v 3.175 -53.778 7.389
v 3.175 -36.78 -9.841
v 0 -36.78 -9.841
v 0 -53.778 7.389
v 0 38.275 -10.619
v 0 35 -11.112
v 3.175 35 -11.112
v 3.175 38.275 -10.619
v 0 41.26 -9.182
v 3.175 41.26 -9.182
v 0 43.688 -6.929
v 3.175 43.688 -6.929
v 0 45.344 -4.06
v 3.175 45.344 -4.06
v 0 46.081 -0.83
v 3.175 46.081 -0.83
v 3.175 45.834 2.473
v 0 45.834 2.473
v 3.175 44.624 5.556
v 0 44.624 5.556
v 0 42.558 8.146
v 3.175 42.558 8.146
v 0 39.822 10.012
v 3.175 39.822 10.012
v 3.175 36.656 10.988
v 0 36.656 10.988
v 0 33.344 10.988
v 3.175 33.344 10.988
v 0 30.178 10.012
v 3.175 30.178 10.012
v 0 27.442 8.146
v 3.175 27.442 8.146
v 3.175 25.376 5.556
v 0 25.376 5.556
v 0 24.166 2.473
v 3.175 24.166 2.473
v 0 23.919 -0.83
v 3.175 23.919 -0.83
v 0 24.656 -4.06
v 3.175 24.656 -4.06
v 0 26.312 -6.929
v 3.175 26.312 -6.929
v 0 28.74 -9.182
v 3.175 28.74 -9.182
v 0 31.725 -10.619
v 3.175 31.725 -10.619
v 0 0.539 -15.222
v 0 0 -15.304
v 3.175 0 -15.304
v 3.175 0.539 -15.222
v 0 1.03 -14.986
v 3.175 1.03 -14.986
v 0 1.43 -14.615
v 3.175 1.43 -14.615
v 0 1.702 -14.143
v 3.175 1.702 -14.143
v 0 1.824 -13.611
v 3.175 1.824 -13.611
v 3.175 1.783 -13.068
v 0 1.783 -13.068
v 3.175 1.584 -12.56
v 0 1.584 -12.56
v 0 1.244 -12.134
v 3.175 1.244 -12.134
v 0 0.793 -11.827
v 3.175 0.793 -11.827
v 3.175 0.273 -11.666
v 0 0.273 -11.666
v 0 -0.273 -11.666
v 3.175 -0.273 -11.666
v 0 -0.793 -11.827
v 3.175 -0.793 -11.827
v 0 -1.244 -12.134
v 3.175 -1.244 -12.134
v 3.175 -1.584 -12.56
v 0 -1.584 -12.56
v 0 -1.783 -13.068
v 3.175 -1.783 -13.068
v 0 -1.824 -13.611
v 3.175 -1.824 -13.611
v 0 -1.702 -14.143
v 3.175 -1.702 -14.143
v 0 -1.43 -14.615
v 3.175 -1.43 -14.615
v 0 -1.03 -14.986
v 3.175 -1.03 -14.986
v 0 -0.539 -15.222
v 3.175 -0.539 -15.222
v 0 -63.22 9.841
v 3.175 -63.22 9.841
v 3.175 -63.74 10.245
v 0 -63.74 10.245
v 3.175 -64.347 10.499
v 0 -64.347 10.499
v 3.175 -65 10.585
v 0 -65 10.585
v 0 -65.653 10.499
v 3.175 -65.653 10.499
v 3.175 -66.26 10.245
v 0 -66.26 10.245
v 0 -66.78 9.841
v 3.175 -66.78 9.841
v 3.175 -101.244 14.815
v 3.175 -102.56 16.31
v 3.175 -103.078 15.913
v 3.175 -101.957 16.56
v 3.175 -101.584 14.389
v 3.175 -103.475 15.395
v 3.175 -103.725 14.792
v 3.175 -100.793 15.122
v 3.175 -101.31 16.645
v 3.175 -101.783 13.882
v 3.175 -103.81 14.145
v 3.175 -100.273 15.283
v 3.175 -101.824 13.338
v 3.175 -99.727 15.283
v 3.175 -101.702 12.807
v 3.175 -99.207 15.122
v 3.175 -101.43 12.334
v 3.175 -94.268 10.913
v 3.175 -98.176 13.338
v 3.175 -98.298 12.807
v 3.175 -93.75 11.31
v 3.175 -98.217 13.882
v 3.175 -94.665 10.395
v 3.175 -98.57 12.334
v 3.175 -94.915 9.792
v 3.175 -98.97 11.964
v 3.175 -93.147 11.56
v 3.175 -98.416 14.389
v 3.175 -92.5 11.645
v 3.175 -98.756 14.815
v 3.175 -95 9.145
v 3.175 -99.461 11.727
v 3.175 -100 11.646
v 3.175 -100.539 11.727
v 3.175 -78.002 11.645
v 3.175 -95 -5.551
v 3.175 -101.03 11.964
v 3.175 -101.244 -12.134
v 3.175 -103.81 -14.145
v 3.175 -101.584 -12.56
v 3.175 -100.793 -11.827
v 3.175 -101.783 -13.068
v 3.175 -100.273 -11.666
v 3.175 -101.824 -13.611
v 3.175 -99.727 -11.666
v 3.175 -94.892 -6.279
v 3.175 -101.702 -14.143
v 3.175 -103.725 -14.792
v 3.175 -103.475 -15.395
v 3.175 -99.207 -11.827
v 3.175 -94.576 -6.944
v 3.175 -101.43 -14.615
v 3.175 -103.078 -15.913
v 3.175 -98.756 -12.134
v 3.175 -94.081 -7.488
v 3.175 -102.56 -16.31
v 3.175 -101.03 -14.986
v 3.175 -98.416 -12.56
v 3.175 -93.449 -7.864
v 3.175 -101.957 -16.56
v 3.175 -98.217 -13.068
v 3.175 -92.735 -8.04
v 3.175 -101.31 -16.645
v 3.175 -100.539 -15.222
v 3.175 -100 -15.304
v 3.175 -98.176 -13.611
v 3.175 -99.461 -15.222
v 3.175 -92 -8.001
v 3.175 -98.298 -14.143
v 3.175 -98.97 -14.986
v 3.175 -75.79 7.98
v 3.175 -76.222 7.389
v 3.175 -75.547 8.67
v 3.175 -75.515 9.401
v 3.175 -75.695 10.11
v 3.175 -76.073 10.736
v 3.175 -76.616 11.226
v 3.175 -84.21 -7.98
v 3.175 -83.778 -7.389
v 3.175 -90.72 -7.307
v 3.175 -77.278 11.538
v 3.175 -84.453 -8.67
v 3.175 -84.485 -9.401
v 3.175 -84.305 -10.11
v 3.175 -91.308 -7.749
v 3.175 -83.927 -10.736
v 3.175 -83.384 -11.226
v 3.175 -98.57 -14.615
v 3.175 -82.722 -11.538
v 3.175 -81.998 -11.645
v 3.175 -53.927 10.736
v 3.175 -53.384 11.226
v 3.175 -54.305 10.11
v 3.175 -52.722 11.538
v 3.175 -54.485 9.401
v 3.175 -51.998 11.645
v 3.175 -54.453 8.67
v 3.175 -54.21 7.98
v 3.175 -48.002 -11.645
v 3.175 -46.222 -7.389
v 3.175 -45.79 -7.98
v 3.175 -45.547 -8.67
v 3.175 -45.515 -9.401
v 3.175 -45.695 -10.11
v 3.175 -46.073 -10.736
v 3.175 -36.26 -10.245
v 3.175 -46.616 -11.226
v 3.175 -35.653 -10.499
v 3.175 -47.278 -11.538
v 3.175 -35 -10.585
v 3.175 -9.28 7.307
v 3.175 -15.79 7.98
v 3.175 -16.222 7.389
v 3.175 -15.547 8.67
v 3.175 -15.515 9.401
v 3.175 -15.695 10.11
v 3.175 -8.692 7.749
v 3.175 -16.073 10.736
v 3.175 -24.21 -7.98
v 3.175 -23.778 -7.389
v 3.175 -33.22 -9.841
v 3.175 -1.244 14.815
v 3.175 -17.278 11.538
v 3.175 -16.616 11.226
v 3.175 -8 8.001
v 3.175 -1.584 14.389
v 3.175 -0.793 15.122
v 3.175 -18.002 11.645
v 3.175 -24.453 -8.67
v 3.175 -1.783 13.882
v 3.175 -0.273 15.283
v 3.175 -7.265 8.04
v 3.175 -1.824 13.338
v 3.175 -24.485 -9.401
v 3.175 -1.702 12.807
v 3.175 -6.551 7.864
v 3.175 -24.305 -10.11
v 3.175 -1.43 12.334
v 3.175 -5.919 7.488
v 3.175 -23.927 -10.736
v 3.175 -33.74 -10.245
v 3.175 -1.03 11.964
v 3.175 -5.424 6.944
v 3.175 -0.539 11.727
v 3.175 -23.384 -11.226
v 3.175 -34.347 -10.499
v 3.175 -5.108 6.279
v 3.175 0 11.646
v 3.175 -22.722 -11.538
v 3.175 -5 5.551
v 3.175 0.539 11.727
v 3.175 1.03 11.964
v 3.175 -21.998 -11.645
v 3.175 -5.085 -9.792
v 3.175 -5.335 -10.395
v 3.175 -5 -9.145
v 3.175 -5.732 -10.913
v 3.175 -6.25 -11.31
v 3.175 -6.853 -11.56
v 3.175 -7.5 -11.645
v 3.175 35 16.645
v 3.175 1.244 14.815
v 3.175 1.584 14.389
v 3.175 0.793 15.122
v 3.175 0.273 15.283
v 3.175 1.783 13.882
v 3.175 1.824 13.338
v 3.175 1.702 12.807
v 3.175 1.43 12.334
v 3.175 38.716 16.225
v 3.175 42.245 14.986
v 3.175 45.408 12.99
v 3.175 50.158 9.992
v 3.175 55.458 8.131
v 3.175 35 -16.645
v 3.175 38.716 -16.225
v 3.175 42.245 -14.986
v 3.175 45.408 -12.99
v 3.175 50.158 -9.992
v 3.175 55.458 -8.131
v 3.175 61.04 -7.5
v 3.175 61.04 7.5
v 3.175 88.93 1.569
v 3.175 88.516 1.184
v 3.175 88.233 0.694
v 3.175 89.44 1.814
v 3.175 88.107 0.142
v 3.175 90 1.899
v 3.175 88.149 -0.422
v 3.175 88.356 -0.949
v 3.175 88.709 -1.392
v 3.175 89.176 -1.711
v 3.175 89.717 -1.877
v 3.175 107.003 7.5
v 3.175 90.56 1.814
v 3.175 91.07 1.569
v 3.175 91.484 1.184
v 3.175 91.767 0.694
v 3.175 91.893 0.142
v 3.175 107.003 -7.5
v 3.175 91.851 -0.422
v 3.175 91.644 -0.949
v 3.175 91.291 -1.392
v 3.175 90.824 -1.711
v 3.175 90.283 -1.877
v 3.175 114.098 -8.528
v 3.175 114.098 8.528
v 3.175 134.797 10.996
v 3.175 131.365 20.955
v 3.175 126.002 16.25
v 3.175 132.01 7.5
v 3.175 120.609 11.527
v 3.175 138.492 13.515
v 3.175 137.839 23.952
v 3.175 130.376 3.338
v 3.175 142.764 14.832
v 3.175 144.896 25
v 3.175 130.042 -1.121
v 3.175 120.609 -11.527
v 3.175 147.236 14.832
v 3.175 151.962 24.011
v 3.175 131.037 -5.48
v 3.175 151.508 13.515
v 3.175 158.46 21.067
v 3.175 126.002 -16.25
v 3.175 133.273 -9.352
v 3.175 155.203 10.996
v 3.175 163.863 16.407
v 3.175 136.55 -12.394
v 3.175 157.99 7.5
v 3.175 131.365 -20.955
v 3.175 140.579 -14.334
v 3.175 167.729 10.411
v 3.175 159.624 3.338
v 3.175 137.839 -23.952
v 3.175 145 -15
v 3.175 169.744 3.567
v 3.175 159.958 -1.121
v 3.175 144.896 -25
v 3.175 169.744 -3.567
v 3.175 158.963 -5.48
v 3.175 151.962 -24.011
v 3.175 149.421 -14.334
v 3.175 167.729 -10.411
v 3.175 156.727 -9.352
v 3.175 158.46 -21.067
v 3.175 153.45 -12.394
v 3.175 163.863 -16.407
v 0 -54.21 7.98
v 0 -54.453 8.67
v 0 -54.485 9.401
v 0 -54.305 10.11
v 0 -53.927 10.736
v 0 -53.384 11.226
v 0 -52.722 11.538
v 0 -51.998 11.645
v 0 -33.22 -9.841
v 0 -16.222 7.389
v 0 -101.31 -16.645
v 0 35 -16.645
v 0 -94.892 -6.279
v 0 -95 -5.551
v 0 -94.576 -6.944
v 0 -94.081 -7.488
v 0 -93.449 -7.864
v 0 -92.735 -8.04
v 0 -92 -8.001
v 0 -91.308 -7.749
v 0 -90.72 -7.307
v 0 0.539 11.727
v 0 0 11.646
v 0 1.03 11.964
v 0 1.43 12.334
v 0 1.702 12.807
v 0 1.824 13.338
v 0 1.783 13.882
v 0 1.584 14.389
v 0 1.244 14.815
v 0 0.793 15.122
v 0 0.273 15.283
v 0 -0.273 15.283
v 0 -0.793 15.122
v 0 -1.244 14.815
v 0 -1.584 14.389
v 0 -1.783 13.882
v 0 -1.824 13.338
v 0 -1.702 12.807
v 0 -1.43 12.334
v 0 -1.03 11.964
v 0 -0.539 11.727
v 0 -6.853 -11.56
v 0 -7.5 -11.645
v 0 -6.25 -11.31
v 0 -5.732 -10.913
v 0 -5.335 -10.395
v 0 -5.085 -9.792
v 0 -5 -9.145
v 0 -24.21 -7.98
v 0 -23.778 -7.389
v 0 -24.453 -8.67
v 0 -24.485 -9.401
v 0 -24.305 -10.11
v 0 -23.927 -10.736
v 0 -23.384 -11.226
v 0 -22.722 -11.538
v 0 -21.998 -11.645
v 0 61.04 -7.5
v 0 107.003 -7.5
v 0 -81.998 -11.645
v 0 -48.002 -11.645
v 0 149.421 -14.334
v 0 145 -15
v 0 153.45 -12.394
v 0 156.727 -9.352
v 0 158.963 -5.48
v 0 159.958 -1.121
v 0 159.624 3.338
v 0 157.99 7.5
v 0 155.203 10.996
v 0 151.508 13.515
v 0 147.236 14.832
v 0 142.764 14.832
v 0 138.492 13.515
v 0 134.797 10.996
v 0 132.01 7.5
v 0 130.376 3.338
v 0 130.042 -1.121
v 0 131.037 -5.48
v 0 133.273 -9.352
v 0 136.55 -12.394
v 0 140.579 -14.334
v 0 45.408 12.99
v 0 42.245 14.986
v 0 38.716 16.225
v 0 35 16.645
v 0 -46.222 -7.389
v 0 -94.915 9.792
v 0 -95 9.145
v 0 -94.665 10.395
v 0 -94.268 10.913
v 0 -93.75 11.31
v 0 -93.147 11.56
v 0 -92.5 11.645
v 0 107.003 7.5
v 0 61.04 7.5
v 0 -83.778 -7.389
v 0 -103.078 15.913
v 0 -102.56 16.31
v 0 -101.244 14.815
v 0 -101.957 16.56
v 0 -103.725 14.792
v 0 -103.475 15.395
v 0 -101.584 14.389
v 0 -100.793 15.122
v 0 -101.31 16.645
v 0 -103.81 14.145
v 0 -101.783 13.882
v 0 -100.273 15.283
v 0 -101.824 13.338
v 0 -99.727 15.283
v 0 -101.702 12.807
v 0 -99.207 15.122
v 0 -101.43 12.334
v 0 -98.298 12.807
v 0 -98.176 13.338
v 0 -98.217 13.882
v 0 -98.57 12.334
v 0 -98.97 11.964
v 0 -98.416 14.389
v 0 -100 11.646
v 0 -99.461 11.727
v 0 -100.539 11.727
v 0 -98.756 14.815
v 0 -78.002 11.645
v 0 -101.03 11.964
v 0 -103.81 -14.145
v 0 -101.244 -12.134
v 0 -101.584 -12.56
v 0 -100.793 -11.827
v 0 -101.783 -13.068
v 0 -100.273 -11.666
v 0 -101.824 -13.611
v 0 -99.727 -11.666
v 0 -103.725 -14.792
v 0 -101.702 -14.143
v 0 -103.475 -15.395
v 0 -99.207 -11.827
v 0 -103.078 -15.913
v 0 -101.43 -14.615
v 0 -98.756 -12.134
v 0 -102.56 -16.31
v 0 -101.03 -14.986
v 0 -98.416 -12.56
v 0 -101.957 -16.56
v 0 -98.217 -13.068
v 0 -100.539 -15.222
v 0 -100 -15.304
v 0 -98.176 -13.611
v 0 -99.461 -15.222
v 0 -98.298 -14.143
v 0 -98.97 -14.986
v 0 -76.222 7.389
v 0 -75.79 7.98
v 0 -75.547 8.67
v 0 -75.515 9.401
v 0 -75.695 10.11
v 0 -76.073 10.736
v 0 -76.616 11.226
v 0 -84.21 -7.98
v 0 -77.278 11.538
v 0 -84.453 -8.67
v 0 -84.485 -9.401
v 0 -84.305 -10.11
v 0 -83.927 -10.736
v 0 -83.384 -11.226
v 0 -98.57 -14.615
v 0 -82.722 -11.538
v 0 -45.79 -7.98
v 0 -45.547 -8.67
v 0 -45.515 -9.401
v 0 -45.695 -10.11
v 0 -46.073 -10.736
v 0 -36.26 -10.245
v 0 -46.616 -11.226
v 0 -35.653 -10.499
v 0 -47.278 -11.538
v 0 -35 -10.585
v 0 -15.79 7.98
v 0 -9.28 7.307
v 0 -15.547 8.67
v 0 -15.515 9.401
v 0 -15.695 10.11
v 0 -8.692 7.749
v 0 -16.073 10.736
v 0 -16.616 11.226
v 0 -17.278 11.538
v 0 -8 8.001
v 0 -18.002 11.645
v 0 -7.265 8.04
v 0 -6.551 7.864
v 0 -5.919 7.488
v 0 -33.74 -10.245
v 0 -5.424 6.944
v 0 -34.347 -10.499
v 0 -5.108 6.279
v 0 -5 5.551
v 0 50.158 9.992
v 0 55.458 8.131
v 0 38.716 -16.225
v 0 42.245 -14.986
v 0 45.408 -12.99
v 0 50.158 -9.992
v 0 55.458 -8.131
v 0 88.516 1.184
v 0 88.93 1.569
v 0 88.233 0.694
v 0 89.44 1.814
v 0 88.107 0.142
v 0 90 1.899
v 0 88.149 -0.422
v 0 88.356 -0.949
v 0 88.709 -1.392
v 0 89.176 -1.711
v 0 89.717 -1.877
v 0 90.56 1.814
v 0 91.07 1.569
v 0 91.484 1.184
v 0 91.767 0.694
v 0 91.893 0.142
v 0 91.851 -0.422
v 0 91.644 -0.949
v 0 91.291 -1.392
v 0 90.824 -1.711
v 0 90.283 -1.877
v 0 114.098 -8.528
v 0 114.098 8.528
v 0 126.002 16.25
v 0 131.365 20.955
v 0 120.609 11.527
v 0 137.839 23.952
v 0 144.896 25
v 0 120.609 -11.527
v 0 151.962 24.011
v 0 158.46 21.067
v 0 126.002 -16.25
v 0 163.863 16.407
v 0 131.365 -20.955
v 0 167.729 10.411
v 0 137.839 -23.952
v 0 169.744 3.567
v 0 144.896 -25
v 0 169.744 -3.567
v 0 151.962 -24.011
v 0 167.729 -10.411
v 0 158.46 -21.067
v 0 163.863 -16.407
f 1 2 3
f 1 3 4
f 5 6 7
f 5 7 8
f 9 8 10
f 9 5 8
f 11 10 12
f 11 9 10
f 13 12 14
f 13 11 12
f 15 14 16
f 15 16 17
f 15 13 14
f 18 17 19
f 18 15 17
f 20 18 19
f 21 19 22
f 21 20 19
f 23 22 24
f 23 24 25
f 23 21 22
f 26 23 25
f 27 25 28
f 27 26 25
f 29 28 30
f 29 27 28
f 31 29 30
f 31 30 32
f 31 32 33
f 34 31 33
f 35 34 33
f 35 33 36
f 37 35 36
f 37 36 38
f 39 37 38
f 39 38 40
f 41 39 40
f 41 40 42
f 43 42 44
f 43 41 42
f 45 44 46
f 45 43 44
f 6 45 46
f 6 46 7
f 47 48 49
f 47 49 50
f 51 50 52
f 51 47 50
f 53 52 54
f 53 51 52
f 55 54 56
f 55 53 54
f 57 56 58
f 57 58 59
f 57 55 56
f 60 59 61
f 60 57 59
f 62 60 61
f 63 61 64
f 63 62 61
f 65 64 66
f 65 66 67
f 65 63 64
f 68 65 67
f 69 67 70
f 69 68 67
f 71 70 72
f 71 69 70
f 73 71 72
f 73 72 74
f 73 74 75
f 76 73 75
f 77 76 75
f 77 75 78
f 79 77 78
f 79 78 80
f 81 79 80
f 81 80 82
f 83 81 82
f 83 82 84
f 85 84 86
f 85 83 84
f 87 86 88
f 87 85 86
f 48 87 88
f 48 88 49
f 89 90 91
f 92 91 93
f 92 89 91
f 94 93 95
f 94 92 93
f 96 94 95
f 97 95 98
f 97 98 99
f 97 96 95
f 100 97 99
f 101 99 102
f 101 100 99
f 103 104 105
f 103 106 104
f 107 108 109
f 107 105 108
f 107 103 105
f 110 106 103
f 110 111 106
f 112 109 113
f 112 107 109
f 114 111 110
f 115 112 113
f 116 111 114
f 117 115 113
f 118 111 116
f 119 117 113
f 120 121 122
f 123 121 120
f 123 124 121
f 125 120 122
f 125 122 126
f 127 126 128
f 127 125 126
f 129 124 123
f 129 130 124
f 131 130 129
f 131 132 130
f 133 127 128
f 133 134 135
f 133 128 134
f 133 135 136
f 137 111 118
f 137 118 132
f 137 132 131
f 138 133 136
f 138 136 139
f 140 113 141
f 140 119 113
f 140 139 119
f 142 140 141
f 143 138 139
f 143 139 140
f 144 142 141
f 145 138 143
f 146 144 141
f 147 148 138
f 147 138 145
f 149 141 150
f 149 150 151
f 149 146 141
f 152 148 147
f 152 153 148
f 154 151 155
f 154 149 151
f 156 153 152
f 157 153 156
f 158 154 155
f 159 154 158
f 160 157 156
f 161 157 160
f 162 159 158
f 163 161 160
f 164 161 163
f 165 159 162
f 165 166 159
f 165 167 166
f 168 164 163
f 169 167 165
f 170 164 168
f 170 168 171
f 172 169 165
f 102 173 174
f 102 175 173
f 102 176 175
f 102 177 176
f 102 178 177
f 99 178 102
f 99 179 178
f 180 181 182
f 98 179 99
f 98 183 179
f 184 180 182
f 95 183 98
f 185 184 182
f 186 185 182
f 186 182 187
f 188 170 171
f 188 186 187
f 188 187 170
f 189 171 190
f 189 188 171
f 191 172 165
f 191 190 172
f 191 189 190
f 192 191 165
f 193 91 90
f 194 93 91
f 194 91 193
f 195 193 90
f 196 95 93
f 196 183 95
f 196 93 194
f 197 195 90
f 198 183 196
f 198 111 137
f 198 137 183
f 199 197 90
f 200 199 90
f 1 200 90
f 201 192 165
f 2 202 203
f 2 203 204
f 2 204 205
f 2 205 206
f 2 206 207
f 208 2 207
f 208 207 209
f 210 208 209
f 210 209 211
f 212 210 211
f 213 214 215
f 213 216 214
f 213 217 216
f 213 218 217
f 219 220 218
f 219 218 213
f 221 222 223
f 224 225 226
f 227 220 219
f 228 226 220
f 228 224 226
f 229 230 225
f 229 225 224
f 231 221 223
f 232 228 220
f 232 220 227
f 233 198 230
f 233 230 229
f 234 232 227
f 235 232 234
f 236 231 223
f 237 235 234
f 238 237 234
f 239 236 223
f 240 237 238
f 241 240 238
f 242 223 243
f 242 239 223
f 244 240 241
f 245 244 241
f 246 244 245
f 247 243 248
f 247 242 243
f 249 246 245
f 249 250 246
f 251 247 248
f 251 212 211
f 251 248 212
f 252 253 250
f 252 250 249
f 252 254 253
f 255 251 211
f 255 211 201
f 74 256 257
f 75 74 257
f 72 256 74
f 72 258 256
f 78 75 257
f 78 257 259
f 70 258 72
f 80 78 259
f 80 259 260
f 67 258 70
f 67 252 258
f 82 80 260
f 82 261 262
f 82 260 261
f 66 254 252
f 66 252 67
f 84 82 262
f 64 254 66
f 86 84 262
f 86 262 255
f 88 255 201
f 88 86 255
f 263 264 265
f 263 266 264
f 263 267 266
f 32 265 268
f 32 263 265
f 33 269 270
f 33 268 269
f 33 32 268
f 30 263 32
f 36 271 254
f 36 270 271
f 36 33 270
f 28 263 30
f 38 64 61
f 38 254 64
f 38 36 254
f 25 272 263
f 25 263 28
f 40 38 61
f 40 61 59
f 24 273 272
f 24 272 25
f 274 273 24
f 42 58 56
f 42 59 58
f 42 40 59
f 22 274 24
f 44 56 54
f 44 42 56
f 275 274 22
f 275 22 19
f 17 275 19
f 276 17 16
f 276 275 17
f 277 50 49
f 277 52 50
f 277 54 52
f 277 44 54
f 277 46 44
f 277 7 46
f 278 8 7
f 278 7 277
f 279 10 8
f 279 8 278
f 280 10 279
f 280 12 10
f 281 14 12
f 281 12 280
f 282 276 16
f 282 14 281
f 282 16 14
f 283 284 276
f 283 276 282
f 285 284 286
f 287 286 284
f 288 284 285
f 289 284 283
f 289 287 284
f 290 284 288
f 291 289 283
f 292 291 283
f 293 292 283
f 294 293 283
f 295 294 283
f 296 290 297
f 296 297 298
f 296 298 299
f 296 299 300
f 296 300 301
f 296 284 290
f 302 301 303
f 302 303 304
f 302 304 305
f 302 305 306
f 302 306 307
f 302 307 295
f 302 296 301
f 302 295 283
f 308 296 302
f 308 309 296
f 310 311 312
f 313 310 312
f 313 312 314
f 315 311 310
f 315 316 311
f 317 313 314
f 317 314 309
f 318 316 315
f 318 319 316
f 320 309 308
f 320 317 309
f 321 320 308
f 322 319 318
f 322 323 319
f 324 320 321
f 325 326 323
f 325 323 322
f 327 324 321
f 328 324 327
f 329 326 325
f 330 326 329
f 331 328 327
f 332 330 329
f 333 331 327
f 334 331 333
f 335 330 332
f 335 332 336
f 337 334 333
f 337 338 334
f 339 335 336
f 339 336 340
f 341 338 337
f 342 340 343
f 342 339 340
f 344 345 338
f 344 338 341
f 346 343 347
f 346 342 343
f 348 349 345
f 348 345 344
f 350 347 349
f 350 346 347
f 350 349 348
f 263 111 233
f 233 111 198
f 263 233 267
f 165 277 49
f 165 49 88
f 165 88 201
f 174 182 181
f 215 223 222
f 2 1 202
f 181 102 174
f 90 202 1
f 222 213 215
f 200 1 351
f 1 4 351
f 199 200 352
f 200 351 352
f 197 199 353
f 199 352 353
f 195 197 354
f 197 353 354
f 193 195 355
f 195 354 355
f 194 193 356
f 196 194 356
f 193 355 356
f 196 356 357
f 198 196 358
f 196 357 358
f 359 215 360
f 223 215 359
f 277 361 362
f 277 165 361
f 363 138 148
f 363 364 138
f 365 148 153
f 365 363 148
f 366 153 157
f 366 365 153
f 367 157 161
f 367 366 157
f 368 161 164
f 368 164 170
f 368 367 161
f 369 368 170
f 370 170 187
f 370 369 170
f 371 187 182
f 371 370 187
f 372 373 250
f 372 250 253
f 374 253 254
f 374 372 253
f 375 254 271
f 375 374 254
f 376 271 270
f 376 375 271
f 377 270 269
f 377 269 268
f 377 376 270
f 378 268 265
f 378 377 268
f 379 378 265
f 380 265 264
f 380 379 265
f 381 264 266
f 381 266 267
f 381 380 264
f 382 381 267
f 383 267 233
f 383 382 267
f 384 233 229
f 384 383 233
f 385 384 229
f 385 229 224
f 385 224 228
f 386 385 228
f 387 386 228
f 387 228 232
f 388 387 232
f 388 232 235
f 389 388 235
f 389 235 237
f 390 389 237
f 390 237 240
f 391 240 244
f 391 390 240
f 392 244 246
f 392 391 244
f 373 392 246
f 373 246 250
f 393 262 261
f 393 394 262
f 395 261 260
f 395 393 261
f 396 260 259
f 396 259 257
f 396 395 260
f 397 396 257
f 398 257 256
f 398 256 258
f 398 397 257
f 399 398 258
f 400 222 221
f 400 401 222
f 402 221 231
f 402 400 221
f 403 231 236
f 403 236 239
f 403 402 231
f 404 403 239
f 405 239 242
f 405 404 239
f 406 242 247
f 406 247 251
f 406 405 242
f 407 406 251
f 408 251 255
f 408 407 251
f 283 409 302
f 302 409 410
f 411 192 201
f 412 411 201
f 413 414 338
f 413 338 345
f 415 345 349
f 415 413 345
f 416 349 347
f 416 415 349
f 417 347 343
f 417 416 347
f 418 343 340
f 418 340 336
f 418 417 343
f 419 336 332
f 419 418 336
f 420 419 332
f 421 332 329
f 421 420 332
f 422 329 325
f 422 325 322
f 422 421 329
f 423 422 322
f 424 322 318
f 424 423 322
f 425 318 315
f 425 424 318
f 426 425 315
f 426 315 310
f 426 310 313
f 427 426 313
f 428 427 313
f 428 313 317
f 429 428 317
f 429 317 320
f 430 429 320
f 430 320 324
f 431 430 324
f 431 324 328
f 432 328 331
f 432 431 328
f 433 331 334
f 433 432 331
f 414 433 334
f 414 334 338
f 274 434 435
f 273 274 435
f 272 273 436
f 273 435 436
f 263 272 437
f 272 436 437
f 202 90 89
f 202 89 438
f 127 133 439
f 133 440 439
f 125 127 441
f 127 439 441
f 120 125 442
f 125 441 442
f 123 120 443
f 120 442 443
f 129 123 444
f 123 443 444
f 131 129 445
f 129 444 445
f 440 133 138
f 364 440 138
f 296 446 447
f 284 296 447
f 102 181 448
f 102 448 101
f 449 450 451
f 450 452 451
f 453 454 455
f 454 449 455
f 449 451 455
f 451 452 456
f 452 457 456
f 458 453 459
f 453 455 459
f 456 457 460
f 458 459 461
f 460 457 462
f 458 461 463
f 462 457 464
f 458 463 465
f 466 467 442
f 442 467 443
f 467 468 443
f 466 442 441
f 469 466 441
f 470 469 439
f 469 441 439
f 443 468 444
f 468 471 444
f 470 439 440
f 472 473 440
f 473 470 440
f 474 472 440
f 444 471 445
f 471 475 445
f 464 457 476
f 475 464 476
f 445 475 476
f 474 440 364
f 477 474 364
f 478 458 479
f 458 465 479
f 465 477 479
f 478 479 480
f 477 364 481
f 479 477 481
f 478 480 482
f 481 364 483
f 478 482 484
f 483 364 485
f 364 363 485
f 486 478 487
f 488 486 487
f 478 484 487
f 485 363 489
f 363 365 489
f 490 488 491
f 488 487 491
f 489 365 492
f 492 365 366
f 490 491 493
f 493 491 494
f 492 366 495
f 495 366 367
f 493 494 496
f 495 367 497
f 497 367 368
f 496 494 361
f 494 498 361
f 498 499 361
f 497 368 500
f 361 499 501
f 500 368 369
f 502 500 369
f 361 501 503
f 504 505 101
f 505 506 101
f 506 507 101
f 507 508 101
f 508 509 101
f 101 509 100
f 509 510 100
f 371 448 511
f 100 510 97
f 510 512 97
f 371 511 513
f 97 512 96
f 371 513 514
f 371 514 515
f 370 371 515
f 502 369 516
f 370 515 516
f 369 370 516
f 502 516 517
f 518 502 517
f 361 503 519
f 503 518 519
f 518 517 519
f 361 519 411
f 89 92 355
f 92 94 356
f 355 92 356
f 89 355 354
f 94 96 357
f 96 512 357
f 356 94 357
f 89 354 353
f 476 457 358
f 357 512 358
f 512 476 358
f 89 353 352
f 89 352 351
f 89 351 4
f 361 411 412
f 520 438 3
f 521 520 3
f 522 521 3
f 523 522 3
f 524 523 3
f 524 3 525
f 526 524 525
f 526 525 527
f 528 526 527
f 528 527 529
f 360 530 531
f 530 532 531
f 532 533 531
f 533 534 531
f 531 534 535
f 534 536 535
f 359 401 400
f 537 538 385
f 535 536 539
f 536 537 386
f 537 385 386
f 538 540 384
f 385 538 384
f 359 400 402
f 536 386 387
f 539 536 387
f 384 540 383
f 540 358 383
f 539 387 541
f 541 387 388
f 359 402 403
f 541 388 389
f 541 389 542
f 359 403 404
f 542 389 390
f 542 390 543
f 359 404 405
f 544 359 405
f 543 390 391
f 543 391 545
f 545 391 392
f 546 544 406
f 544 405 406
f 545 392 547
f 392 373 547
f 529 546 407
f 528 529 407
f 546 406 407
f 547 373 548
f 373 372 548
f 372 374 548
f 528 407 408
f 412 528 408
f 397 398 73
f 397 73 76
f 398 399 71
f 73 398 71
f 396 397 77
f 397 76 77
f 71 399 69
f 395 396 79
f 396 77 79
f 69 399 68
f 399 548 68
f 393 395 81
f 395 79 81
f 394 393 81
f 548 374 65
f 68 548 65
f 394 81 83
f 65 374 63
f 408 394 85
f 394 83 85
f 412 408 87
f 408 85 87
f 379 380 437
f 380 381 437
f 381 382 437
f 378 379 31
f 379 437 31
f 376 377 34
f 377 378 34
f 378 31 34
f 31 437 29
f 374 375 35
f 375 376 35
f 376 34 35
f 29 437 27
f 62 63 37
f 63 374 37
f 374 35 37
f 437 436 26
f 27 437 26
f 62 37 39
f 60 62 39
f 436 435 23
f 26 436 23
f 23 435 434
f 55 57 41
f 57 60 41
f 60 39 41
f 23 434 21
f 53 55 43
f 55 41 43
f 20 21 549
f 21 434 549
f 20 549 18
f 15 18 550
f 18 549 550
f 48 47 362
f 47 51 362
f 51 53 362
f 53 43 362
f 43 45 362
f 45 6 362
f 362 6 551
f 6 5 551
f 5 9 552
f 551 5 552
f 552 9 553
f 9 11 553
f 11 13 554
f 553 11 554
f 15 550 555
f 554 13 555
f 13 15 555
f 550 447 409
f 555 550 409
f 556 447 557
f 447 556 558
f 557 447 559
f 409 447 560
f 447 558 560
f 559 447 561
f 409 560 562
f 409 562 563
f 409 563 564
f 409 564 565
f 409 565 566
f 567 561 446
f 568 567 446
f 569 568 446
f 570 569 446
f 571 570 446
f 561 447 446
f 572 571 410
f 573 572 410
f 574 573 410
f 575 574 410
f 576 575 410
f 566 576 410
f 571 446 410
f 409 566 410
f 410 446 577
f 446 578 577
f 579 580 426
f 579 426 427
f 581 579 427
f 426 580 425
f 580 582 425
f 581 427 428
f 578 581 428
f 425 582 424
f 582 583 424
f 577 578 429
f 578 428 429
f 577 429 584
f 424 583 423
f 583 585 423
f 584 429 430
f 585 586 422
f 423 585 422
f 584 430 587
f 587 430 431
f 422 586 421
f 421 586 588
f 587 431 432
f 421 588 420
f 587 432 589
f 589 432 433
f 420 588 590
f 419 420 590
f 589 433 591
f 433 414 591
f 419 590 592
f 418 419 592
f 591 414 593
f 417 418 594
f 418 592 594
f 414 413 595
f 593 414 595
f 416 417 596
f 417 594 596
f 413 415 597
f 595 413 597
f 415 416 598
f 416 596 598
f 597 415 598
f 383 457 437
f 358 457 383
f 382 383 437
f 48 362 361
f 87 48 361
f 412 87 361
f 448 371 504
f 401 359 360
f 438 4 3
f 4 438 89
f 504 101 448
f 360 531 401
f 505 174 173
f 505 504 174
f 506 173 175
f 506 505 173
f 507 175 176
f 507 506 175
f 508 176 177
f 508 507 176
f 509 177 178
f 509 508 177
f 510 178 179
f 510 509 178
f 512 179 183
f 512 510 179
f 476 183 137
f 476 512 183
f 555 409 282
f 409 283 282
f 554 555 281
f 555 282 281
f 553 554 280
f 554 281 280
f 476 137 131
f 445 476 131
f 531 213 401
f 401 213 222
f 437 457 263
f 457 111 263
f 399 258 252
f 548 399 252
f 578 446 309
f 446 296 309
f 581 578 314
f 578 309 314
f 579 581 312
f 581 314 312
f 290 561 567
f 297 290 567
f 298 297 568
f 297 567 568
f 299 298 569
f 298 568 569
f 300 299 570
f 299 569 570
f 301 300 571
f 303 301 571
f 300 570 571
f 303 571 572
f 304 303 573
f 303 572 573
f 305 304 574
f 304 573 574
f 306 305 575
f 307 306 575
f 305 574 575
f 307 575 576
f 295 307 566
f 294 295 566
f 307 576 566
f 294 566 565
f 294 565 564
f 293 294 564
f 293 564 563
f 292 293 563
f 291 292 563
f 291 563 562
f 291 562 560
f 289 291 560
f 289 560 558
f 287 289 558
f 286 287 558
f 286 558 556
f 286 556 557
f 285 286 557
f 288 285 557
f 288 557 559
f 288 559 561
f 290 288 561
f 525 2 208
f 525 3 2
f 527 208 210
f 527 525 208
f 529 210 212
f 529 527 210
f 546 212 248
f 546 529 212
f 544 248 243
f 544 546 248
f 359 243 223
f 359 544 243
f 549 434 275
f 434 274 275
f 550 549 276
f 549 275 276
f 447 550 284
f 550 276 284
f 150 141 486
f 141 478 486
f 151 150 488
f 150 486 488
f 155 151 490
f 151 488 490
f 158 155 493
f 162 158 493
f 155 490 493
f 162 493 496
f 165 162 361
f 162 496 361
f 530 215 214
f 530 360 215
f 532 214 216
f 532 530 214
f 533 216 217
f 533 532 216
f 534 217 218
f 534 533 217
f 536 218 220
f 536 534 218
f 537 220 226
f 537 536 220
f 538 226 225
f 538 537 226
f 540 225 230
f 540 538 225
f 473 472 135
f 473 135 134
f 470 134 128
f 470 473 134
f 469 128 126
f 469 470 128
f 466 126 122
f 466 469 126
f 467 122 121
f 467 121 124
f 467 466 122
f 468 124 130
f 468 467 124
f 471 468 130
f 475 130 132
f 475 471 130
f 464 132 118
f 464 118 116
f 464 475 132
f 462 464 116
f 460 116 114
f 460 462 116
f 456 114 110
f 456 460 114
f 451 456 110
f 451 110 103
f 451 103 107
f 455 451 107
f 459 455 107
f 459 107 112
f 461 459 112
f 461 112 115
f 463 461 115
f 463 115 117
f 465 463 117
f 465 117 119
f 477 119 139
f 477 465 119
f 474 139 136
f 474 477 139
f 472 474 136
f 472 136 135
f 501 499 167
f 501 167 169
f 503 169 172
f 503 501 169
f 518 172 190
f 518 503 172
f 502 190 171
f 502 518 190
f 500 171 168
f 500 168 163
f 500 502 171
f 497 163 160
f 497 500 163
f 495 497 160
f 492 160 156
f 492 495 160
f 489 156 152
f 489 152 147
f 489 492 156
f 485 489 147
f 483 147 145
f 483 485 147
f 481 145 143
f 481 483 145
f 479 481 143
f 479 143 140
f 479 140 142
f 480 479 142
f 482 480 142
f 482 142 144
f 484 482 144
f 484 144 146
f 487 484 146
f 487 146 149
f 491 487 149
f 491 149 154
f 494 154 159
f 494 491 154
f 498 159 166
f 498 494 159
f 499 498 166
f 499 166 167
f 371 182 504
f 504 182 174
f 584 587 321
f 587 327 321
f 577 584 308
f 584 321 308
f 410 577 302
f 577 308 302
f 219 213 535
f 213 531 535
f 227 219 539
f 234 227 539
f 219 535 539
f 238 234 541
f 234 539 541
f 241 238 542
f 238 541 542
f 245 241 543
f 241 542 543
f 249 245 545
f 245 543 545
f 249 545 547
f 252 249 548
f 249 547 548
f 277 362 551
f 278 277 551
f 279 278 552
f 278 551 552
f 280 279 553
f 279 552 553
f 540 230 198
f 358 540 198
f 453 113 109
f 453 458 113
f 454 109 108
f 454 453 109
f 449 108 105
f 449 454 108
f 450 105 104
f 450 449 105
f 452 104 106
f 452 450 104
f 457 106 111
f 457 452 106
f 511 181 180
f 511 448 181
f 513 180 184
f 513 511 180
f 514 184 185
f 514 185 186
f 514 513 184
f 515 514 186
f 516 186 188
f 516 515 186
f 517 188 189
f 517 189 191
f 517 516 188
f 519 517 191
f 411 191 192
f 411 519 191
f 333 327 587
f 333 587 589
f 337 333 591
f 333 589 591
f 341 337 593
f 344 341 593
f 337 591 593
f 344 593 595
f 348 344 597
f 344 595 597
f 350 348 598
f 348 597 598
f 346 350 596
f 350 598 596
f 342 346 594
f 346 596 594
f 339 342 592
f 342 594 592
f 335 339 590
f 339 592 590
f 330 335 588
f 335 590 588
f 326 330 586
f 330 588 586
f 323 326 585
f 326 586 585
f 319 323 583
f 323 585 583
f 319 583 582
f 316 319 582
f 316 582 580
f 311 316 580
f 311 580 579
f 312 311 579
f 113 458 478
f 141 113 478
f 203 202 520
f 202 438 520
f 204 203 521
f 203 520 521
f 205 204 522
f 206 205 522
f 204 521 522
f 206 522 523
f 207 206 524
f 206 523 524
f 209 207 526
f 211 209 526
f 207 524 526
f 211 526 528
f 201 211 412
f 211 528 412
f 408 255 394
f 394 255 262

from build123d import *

# Parameters (mm, degrees)
SKETCH1_R             = 15
SKETCH1_R_2           = 1.8288
SKETCH1_R_3           = 11.1125
BOSS_EXTRUDE1_DEPTH   = 3.175
CUT_EXTRUDE1_REACH    = 173.858
SKETCH2_W             = 4.112404804
SKETCH2_H             = 127.6975
FILLET3_R             = 2.5
FILLET4_R             = 25
F_6_CLEARANCE_HOLE1_D = 3.7973


with BuildPart() as part:
    # Sketch1 → Boss-Extrude1 (new body)
    with BuildSketch(Plane(origin=(0, 0, 0), x_dir=(0, 0, -1), z_dir=(1, 0, 0))):
        with BuildLine():
            Line((20.757404804, -103.81), (20.757404804, -5))
            Line((20.757404804, -5), (16.645, 5.681808734))
            Line((16.645, 5.681808734), (16.645, 35))
            ThreePointArc((16.645, 35), (14.175569213, 43.724062271), (7.5, 49.85954323))
            Line((7.5, 49.85954323), (7.5, 121.151519965))
            ThreePointArc((7.5, 121.151519965), (0, 170), (-7.5, 121.151519965))
            Line((-7.5, 121.151519965), (-7.5, 49.85954323))
            ThreePointArc((-7.5, 49.85954323), (-14.175569213, 43.724062271), (-16.645, 35))
            Line((-16.645, 35), (-16.645, 5.681808734))
            Line((-16.645, 5.681808734), (-20.757404804, -5))
            Line((-20.757404804, -5), (-20.757404804, -103.81))
            Line((-20.757404804, -103.81), (20.757404804, -103.81))
        make_face()
        with Locations((0, 145)):
            Circle(SKETCH1_R, mode=Mode.SUBTRACT)
        with Locations((-13.4747, -100)):
            Circle(SKETCH1_R_2, mode=Mode.SUBTRACT)
        with Locations((13.4747, -100)):
            Circle(SKETCH1_R_2, mode=Mode.SUBTRACT)
        with Locations((-13.4747, 0)):
            Circle(SKETCH1_R_2, mode=Mode.SUBTRACT)
        with Locations((13.4747, 0)):
            Circle(SKETCH1_R_2, mode=Mode.SUBTRACT)
        with Locations((0, 35)):
            Circle(SKETCH1_R_3, mode=Mode.SUBTRACT)
    extrude(amount=BOSS_EXTRUDE1_DEPTH)

    # Sketch2 → Cut-Extrude1 (cut, up to next)
    with BuildSketch(Plane(origin=(3.175, 0, 0), x_dir=(0, 0, -1), z_dir=(1, 0, 0)), mode=Mode.PRIVATE) as cut_extrude1_sk1:
        Polygon((11.645, -5), (-11.645, -5), (11.645, -27.976379872), align=None)
    cut_extrude1_tool1 = extrude(cut_extrude1_sk1.sketch, amount=-CUT_EXTRUDE1_REACH, mode=Mode.PRIVATE) & part.part
    # Sketch2 → Cut-Extrude1 (cut, up to next)
    with BuildSketch(Plane(origin=(3.175, 0, 0), x_dir=(0, 0, -1), z_dir=(1, 0, 0)), mode=Mode.PRIVATE) as cut_extrude1_sk2:
        Polygon((-11.645, -12.023620128), (11.645, -35), (-11.645, -57.976379872), (-11.645, -35), align=None)
    cut_extrude1_tool2 = extrude(cut_extrude1_sk2.sketch, amount=-CUT_EXTRUDE1_REACH, mode=Mode.PRIVATE) & part.part
    # Sketch2 → Cut-Extrude1 (cut, up to next)
    with BuildSketch(Plane(origin=(3.175, 0, 0), x_dir=(0, 0, -1), z_dir=(1, 0, 0)), mode=Mode.PRIVATE) as cut_extrude1_sk3:
        Polygon((-11.645, -72.023620128), (-11.645, -95), (11.645, -95), align=None)
    cut_extrude1_tool3 = extrude(cut_extrude1_sk3.sketch, amount=-CUT_EXTRUDE1_REACH, mode=Mode.PRIVATE) & part.part
    # Sketch2 → Cut-Extrude1 (cut, up to next)
    with BuildSketch(Plane(origin=(3.175, 0, 0), x_dir=(0, 0, -1), z_dir=(1, 0, 0)), mode=Mode.PRIVATE) as cut_extrude1_sk4:
        Polygon((11.645, -42.023620128), (11.645, -65), (11.645, -87.976379872), (-11.645, -65), align=None)
    cut_extrude1_tool4 = extrude(cut_extrude1_sk4.sketch, amount=-CUT_EXTRUDE1_REACH, mode=Mode.PRIVATE) & part.part
    # Sketch2 → Cut-Extrude1 (cut, up to next)
    with BuildSketch(Plane(origin=(3.175, 0, 0), x_dir=(0, 0, -1), z_dir=(1, 0, 0)), mode=Mode.PRIVATE) as cut_extrude1_sk5:
        with Locations((-18.701202402, -39.96125)):
            Rectangle(SKETCH2_W, SKETCH2_H)
    cut_extrude1_tool5 = extrude(cut_extrude1_sk5.sketch, amount=-CUT_EXTRUDE1_REACH, mode=Mode.PRIVATE) & part.part
    # Sketch2 → Cut-Extrude1 (cut, up to next)
    with BuildSketch(Plane(origin=(3.175, 0, 0), x_dir=(0, 0, -1), z_dir=(1, 0, 0)), mode=Mode.PRIVATE) as cut_extrude1_sk6:
        with Locations((18.701202402, -39.96125)):
            Rectangle(SKETCH2_W, SKETCH2_H)
    cut_extrude1_tool6 = extrude(cut_extrude1_sk6.sketch, amount=-CUT_EXTRUDE1_REACH, mode=Mode.PRIVATE) & part.part
    add(cut_extrude1_tool1.solids().sort_by_distance((3.175, -12.658793, -3.881667))[0], mode=Mode.SUBTRACT)
    add(cut_extrude1_tool2.solids().sort_by_distance((3.175, -35, 3.881667))[0], mode=Mode.SUBTRACT)
    add(cut_extrude1_tool3.solids().sort_by_distance((3.175, -87.341207, 3.881667))[0], mode=Mode.SUBTRACT)
    add(cut_extrude1_tool4.solids().sort_by_distance((3.175, -65, -3.881667))[0], mode=Mode.SUBTRACT)
    add(cut_extrude1_tool5.solids().sort_by_distance((3.175, -39.96125, 18.701202))[0], mode=Mode.SUBTRACT)
    add(cut_extrude1_tool6.solids().sort_by_distance((3.175, -39.96125, -18.701202))[0], mode=Mode.SUBTRACT)

    # Fillet3
    fillet3_edges = [part.edges().sort_by_distance(p)[0] for p in [
        (1.5875, -103.81, 16.645),
        (1.5875, -12.023620128, 11.645),
        (1.5875, -35, -11.645),
        (1.5875, -57.976379872, 11.645),
        (1.5875, -103.81, -16.645),
        (1.5875, -72.023620128, 11.645),
        (1.5875, -95, -11.645),
        (1.5875, -95, 11.645),
        (1.5875, -87.976379872, -11.645),
        (1.5875, -65, 11.645),
        (1.5875, -42.023620128, -11.645),
        (1.5875, -27.976379872, -11.645),
        (1.5875, -5, 11.645),
        (1.5875, -5, -11.645),
    ]]
    fillet(fillet3_edges, radius=FILLET3_R)

    # Fillet4
    fillet4_edges = [part.edges().sort_by_distance(p)[0] for p in [
        (1.5875, 49.85954323, 7.5),
        (1.5875, 121.151519965, 7.5),
        (1.5875, 121.151519965, -7.5),
        (1.5875, 49.85954323, -7.5),
    ]]
    fillet(fillet4_edges, radius=FILLET4_R)

    # #6 Clearance Hole1 (through all)
    with Locations(Plane(origin=(3.175, 0, 0), x_dir=(0, 0, -1), z_dir=(1, 0, 0))):
        with Locations((0, 90)):
            Hole(F_6_CLEARANCE_HOLE1_D / 2)


solid = part.part
